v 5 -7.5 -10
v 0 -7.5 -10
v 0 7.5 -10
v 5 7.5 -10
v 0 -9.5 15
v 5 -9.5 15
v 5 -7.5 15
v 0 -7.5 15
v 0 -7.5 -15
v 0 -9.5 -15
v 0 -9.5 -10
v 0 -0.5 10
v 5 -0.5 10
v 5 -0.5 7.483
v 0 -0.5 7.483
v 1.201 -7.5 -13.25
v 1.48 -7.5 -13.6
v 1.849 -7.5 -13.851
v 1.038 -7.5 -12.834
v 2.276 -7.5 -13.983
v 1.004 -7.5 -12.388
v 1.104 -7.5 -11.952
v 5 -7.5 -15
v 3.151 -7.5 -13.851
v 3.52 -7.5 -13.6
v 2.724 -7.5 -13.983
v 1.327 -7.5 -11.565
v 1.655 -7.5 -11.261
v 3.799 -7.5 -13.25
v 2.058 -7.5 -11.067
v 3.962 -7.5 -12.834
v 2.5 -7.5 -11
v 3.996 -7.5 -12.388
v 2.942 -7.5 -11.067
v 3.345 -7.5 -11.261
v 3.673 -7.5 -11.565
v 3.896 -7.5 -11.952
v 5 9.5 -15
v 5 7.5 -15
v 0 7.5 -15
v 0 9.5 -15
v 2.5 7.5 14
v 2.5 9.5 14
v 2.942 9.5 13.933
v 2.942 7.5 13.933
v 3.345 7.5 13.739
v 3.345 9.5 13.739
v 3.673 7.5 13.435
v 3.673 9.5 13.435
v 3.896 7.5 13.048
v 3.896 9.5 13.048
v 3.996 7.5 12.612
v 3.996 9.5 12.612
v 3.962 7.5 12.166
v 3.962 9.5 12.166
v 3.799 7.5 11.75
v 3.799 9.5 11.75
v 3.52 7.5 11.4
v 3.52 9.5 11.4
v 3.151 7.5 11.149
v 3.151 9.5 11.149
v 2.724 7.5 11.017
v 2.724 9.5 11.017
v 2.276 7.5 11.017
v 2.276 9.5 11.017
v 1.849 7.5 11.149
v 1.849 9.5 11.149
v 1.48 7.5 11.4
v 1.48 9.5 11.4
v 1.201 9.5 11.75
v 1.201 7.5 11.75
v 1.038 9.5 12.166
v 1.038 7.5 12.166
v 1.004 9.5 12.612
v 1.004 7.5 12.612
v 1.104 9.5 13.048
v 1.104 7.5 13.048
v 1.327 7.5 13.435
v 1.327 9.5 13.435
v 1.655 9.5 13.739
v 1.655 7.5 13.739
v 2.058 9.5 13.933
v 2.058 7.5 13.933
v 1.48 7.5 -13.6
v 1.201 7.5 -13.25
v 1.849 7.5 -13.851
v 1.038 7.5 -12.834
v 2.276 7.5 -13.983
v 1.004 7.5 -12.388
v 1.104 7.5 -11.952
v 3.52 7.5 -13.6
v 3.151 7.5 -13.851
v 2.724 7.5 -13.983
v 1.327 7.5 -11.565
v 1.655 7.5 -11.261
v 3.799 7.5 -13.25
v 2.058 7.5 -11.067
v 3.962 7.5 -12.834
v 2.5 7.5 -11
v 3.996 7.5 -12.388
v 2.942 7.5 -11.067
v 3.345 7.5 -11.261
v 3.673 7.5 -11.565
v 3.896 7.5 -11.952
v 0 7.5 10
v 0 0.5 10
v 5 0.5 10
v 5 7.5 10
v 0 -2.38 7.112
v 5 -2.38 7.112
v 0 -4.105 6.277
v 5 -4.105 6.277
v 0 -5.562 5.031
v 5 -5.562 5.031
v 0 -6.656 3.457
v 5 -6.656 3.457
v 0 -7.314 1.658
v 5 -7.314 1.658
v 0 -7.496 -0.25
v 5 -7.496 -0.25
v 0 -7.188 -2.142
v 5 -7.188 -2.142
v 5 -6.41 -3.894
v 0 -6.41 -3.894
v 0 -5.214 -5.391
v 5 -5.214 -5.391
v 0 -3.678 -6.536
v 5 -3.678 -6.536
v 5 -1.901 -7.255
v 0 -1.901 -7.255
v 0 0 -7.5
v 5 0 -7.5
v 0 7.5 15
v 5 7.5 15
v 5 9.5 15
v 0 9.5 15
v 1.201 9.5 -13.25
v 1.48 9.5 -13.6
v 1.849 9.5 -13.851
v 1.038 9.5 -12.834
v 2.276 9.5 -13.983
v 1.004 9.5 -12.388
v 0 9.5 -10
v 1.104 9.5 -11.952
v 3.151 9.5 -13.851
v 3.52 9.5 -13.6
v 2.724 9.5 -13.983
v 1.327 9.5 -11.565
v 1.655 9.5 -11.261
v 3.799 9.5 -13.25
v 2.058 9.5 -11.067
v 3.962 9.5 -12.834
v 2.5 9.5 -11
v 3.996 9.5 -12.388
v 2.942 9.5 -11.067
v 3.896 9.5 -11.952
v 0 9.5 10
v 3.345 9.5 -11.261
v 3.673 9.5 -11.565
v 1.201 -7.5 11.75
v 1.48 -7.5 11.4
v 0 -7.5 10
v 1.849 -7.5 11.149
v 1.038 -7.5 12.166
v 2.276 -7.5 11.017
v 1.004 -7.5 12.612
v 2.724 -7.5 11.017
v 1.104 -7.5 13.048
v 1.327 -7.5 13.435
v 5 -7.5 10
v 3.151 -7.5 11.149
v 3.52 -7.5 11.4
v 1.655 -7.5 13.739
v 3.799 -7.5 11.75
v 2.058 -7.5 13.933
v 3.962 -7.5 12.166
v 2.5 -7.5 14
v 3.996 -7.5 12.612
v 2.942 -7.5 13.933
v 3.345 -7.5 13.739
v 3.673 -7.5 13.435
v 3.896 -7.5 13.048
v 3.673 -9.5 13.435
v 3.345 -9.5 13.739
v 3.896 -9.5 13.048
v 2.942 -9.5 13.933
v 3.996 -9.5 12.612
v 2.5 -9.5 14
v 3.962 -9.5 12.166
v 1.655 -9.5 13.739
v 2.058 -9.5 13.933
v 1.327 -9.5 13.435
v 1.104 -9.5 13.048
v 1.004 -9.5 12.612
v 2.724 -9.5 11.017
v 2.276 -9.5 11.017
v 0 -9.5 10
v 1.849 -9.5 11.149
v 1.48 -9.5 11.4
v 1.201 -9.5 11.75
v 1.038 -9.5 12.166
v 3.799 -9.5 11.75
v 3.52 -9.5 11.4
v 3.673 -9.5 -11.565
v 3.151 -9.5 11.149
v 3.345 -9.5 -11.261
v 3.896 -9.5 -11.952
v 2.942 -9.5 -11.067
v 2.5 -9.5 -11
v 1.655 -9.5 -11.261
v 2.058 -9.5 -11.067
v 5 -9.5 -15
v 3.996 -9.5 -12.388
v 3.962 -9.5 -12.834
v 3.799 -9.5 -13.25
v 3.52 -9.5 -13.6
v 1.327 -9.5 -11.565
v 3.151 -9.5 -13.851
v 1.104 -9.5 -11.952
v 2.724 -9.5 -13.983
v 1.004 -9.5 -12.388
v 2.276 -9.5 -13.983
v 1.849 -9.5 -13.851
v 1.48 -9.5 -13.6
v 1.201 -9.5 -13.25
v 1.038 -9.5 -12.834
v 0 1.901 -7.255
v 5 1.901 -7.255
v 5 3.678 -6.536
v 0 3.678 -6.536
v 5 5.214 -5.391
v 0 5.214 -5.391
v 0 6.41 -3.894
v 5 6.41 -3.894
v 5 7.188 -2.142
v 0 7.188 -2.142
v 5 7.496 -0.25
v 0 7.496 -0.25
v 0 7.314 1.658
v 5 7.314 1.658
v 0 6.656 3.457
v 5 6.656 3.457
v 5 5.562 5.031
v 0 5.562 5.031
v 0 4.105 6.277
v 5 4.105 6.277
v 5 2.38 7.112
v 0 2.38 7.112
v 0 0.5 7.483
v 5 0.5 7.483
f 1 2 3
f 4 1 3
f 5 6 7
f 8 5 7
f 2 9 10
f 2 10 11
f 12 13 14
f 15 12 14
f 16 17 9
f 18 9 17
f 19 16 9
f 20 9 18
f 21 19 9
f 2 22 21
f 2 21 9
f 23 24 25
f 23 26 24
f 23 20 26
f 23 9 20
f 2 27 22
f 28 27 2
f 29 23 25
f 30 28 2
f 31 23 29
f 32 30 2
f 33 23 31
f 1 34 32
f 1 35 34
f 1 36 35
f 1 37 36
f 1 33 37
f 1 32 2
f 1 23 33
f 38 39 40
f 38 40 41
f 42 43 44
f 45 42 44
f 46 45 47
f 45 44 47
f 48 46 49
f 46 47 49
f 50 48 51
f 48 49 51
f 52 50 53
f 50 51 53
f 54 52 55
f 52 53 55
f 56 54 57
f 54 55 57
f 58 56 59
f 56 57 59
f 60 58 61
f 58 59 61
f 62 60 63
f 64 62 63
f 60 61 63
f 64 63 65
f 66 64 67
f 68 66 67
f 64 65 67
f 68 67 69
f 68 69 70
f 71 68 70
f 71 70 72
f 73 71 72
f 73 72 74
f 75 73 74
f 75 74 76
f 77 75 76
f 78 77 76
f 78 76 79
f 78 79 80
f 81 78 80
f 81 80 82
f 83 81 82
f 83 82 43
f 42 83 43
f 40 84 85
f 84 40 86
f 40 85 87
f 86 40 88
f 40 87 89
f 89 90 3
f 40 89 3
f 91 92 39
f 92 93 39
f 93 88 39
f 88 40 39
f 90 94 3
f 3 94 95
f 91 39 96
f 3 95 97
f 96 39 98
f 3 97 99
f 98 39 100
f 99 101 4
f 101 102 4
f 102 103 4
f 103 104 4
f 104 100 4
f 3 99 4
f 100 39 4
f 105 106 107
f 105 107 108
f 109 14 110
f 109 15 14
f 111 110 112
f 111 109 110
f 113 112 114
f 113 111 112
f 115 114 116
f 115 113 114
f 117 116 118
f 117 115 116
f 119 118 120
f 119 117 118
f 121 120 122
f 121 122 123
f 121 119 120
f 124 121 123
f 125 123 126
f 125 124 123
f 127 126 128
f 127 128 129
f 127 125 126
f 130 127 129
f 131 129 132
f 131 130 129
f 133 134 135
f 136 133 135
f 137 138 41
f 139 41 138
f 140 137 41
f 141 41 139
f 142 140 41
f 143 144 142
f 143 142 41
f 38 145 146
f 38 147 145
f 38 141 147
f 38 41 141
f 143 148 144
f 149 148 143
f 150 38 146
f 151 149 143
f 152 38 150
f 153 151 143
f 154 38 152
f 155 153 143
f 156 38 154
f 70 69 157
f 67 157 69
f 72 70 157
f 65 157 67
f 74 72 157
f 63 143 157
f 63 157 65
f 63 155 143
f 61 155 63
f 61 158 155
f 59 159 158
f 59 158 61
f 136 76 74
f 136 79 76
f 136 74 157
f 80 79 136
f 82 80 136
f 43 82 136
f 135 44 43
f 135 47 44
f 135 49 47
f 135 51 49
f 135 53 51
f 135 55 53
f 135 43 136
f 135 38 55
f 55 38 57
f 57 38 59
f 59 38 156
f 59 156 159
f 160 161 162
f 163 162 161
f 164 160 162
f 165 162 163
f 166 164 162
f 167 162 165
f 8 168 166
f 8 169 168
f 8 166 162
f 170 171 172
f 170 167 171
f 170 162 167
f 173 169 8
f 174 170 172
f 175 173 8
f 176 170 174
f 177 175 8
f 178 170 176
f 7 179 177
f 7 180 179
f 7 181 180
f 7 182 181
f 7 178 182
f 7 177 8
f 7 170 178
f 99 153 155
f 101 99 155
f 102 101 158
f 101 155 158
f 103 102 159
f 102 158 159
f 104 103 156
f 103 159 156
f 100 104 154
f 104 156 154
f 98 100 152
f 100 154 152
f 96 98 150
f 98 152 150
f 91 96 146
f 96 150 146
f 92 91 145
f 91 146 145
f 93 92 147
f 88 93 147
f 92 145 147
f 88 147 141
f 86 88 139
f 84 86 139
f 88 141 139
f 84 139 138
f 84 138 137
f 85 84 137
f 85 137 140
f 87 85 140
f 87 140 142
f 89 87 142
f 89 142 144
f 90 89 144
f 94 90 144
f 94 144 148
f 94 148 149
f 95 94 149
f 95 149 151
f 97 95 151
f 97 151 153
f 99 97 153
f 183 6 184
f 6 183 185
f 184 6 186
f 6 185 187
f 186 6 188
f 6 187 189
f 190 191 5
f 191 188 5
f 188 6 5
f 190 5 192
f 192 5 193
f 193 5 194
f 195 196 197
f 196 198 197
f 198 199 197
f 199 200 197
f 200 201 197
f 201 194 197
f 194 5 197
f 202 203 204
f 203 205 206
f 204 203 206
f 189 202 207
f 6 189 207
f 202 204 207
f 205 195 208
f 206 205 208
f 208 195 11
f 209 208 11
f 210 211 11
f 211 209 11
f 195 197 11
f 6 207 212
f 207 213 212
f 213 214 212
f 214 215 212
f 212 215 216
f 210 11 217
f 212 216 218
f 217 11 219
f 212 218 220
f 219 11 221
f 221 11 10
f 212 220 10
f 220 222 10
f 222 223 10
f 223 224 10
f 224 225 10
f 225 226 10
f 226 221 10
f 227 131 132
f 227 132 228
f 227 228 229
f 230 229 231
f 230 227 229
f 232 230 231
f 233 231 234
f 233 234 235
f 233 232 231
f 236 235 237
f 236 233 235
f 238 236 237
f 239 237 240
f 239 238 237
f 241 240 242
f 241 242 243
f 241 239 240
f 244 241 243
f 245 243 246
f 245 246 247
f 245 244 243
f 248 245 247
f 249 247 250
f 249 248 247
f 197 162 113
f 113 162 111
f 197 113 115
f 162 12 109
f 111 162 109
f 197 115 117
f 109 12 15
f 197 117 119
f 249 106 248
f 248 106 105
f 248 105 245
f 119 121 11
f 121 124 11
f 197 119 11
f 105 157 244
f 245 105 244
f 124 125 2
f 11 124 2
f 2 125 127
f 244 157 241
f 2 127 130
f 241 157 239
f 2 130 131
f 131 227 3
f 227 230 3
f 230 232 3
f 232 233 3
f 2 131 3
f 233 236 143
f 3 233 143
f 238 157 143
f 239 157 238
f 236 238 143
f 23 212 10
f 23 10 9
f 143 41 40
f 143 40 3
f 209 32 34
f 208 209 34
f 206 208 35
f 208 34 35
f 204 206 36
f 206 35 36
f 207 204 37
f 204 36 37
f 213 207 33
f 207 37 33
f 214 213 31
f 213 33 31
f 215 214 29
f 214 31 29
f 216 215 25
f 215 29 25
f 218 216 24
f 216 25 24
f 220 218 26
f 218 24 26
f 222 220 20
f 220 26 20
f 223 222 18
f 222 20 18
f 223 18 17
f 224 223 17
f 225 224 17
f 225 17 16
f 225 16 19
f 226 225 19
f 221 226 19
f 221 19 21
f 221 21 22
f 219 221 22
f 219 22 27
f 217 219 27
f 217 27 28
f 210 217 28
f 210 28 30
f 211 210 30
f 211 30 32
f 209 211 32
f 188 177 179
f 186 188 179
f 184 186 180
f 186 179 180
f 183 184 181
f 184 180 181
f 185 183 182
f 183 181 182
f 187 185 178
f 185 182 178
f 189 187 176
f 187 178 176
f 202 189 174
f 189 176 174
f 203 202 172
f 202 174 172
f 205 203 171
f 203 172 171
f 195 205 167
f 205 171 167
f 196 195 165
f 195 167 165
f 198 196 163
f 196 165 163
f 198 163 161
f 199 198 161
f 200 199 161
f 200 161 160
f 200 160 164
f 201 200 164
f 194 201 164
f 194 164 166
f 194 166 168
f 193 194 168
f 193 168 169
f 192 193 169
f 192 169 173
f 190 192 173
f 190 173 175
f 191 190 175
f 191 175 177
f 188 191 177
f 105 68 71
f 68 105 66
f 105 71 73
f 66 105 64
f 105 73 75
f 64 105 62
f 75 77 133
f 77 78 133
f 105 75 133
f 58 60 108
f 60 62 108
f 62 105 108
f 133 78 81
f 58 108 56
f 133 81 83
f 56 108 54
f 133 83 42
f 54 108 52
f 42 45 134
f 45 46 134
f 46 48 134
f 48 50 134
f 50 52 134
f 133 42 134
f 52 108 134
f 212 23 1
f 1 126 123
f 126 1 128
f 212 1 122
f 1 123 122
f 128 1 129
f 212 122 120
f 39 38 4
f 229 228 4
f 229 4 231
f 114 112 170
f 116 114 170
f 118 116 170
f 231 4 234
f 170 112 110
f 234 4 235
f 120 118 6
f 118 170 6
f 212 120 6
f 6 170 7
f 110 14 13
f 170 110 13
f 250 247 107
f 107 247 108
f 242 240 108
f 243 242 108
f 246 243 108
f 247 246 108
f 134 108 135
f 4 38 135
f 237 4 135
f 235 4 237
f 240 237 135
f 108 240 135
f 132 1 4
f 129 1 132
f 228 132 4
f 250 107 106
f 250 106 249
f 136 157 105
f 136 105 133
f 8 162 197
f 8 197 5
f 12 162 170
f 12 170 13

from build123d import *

# Parameters (mm, degrees)
SKETCH_1_W           = 20
SKETCH_1_H           = 19
SKETCH_1_R           = 7.5
EXTRUDE_3_DEPTH      = 5
EXTRUDE_4_DEPTH      = 0.0001
EXTRUDE_4_DEPTH_BACK = 5
SKETCH_3_W           = 5
SKETCH_3_H           = 2
SKETCH_4_R           = 1.5
CUT_EXTRUDE_1_DEPTH  = 25.718414189
SKETCH_5_R           = 1.5
CUT_EXTRUDE_2_DEPTH  = 25.718414189
SKETCH_6_W           = 5.334039958
SKETCH_6_H           = 1
CUT_EXTRUDE_3_DEPTH  = 19.445893852


with BuildPart() as part:
    # 草图1 → 凸台-拉伸3 (new body)
    with BuildSketch(Plane(origin=(0, 0, 0), x_dir=(0, 0, -1), z_dir=(1, 0, 0))):
        Rectangle(SKETCH_1_W, SKETCH_1_H)
        Circle(SKETCH_1_R, mode=Mode.SUBTRACT)
    extrude(amount=EXTRUDE_3_DEPTH)

    # 草图3 → 凸台-拉伸4 (add, two sides: drawn at the far end of the back side and taken through both)
    with BuildSketch(Plane.ZY.offset(-EXTRUDE_4_DEPTH_BACK)):
        with Locations((12.5, 8.5)):
            Rectangle(SKETCH_3_W, SKETCH_3_H)
        with Locations((12.5, -8.5)):
            Rectangle(SKETCH_3_W, SKETCH_3_H)
        with Locations((-12.5, 8.5)):
            Rectangle(SKETCH_3_W, SKETCH_3_H)
        with Locations((-12.5, -8.5)):
            Rectangle(SKETCH_3_W, SKETCH_3_H)
    extrude(amount=EXTRUDE_4_DEPTH + EXTRUDE_4_DEPTH_BACK)

    # 草图4 → 切除-拉伸1 (cut, through all)
    with BuildSketch(Plane(origin=(0, 9.5, 0), x_dir=(1, 0, 0), z_dir=(0, 1, 0))):
        with Locations(Location((2.49995, -12.5, 0), (0, 0, 270))):
            Circle(SKETCH_4_R)
    extrude(amount=-CUT_EXTRUDE_1_DEPTH, mode=Mode.SUBTRACT)

    # 草图5 → 切除-拉伸2 (cut, through all)
    with BuildSketch(Plane(origin=(0, 9.5, 0), x_dir=(1, 0, 0), z_dir=(0, 1, 0))):
        with Locations(Location((2.49995, 12.5, 0), (0, 0, 270))):
            Circle(SKETCH_5_R)
    extrude(amount=-CUT_EXTRUDE_2_DEPTH, mode=Mode.SUBTRACT)

    # 草图6 → 切除-拉伸3 (cut, through all)
    with BuildSketch(Plane(origin=(5, 0, 0), x_dir=(0, 0, -1), z_dir=(1, 0, 0))):
        with Locations((-7.5, 0)):
            Rectangle(SKETCH_6_W, SKETCH_6_H)
    extrude(amount=-CUT_EXTRUDE_3_DEPTH, mode=Mode.SUBTRACT)


solid = part.part
